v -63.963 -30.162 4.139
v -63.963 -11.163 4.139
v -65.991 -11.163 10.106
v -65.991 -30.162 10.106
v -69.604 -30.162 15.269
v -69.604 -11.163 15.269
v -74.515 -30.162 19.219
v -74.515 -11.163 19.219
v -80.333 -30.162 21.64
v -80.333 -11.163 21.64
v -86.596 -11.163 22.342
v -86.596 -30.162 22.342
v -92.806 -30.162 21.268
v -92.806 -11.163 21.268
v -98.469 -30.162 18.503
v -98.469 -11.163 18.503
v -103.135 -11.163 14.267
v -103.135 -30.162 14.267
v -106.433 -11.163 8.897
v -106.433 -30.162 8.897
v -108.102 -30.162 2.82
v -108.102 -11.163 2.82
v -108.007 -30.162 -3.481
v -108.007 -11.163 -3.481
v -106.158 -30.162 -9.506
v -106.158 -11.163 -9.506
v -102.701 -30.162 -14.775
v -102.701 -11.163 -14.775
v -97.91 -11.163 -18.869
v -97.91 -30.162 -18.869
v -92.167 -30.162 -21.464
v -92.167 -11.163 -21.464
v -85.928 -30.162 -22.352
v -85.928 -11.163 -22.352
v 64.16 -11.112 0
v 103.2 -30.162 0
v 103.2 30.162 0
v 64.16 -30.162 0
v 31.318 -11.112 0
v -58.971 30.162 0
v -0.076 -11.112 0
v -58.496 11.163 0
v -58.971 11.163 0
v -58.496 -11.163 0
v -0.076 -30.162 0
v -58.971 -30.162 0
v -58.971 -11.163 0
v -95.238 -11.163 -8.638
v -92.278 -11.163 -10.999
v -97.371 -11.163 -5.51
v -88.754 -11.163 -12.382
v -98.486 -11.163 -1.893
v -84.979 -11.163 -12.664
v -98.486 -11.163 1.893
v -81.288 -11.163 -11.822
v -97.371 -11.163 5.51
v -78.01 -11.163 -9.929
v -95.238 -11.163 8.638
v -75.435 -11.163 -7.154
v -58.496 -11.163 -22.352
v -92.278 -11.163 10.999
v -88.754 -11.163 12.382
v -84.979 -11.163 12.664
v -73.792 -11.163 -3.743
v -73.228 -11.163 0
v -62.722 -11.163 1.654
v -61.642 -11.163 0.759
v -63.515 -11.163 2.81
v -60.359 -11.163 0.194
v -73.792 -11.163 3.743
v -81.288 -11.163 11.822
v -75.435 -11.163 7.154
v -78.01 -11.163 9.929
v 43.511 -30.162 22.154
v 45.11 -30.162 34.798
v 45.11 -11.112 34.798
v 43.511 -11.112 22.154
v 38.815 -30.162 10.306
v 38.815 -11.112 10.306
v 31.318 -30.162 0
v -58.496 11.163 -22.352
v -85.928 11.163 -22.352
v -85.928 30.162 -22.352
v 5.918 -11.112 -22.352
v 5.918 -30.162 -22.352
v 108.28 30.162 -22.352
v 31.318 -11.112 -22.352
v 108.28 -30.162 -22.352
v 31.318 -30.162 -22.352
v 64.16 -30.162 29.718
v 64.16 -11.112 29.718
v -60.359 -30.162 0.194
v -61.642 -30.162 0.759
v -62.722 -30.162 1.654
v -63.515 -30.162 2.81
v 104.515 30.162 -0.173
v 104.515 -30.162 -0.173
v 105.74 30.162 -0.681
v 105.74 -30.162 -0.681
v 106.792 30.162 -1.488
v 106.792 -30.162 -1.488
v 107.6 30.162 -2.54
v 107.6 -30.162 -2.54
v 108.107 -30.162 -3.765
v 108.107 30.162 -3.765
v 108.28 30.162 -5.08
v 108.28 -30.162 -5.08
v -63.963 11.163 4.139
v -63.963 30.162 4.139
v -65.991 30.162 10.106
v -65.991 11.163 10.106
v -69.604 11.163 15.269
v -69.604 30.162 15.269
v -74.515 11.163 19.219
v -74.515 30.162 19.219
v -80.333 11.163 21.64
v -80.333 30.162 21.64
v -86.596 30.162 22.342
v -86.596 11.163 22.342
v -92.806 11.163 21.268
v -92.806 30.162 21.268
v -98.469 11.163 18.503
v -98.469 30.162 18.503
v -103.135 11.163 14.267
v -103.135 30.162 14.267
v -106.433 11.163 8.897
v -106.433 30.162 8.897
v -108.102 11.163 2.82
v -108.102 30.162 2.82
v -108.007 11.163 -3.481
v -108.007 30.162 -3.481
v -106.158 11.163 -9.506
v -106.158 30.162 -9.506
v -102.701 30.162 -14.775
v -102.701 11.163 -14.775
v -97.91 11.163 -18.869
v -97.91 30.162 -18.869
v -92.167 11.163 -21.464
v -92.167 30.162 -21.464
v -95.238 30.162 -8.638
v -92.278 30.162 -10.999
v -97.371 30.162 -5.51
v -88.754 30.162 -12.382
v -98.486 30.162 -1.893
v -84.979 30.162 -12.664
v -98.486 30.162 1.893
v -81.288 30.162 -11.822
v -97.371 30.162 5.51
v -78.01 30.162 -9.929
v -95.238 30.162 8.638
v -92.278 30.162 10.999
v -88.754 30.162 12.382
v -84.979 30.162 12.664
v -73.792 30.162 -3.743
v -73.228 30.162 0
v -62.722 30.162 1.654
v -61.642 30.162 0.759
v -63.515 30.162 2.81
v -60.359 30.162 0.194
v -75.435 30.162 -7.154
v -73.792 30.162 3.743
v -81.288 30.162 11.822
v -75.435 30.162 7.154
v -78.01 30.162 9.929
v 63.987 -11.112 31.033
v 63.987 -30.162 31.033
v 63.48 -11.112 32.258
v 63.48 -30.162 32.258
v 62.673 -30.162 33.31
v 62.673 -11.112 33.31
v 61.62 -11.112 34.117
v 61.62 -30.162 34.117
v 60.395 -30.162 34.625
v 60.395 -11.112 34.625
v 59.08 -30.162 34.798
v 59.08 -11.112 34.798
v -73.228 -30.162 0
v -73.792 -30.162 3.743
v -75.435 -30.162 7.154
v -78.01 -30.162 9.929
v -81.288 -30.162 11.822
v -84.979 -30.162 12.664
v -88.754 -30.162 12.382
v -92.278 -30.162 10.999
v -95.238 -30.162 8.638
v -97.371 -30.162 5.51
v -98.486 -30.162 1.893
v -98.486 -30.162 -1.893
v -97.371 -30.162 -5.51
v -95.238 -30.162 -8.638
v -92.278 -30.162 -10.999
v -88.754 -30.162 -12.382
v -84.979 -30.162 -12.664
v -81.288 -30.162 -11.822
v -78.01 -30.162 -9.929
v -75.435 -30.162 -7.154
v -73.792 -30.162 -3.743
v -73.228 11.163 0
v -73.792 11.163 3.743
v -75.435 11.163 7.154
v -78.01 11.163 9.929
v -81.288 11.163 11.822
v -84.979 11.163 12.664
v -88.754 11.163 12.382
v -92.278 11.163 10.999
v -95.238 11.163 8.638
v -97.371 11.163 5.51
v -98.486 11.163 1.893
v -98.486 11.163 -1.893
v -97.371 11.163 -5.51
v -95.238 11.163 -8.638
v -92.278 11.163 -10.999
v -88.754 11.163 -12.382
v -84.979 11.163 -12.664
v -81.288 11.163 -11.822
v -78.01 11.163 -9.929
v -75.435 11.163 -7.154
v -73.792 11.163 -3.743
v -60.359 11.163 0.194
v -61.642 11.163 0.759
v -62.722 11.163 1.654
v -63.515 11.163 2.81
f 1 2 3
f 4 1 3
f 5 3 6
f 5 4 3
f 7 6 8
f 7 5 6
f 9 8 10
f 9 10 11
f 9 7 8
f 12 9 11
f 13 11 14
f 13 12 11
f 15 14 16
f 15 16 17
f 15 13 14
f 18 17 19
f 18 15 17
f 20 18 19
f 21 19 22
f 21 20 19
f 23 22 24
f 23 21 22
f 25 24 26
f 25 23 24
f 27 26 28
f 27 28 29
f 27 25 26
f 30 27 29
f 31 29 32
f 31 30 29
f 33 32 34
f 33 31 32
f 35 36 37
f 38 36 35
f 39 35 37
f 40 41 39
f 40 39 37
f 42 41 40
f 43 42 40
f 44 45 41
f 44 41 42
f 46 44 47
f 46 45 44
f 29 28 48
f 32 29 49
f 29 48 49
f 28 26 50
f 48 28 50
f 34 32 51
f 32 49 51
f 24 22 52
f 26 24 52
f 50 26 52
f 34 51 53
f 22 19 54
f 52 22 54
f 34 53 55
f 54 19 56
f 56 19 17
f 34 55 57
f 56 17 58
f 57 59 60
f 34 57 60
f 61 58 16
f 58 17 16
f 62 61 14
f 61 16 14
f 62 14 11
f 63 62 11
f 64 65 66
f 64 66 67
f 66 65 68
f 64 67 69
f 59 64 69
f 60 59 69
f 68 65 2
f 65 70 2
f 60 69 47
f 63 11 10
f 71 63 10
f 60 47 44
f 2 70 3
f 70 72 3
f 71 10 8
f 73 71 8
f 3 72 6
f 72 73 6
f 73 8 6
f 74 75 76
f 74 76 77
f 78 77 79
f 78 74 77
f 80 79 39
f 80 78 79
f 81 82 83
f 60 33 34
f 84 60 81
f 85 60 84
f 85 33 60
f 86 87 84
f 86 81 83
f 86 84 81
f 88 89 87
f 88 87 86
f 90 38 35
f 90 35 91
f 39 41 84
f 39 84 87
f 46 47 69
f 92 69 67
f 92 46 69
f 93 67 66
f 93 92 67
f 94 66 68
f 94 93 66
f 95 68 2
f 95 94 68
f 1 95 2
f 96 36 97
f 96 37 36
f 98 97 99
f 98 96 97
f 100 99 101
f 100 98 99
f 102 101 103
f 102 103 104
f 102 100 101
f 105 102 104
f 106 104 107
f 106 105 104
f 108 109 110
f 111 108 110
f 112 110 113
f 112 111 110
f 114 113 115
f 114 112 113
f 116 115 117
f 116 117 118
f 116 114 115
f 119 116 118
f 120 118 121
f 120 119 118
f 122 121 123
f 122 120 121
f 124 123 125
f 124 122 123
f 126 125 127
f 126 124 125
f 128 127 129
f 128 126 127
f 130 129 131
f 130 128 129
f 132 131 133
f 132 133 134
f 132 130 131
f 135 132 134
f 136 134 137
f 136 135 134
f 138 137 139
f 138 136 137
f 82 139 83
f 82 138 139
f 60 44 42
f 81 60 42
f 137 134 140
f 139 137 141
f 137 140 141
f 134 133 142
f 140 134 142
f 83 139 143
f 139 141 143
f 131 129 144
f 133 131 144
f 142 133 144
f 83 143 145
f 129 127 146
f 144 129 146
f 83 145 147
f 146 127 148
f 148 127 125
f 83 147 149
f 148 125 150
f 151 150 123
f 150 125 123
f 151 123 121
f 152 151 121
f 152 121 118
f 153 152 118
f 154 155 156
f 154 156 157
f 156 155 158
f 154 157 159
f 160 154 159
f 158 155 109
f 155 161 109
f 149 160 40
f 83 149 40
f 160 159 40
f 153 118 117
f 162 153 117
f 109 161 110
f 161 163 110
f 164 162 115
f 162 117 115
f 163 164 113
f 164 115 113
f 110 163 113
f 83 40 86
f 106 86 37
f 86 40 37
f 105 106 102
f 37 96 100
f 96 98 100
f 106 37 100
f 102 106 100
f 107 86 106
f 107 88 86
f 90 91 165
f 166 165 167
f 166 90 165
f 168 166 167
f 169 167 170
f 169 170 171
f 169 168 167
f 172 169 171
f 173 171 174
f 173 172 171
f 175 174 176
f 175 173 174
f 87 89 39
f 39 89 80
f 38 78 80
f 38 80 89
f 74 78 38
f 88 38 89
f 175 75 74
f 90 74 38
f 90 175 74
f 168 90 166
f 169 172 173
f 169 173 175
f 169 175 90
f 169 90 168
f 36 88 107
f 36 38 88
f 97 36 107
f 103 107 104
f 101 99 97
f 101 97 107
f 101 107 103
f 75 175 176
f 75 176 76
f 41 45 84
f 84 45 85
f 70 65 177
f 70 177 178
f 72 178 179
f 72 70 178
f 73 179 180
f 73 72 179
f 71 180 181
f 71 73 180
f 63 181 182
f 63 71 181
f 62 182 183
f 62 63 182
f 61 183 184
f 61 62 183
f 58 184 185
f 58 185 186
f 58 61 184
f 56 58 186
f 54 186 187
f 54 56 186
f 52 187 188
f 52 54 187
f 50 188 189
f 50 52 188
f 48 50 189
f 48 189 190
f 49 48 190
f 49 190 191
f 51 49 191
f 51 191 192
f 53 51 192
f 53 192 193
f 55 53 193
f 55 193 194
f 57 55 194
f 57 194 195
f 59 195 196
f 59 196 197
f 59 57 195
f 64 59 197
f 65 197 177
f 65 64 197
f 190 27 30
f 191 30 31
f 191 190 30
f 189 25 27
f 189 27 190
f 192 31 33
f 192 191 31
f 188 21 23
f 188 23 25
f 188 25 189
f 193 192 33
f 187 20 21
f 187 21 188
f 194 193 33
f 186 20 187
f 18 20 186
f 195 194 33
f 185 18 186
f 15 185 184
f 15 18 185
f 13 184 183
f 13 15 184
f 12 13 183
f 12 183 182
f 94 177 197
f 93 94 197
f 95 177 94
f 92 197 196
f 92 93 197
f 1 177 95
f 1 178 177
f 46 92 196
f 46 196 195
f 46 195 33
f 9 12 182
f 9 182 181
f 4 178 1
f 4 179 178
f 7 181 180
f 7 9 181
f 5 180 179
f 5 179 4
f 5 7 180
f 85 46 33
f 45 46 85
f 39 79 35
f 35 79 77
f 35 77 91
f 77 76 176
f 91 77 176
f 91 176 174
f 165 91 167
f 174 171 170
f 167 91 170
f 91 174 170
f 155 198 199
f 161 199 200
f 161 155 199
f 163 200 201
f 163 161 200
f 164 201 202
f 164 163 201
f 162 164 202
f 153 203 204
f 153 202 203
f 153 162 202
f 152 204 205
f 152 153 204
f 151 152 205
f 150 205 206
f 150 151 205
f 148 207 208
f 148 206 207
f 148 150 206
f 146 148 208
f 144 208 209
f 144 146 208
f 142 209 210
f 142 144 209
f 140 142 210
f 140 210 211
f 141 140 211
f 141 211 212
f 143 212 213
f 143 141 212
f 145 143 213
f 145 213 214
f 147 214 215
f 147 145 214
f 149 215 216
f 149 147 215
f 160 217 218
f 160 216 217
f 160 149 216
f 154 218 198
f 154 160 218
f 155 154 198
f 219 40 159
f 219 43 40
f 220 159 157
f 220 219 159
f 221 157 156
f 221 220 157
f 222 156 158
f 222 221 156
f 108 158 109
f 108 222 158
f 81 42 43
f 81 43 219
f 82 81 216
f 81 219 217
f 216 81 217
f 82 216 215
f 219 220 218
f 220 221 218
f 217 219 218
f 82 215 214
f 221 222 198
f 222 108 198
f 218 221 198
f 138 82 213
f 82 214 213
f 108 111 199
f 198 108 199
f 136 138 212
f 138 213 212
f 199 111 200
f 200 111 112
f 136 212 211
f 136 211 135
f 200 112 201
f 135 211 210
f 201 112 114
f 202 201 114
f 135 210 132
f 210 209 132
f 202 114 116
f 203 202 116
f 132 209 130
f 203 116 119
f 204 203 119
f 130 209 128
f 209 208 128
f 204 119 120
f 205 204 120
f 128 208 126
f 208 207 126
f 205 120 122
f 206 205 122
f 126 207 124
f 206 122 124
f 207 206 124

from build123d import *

# Parameters (mm, degrees)
F0_R     = 12.7
F1_DEPTH = 30.1625
F2_W     = 5.08
F2_H     = 22.3266
F2_W_2   = 65.9883690595
F3_DEPTH = 254
F5_DEPTH = 19.05
F7_DEPTH = 19.05
F8_R     = 5.08


with BuildPart() as f1:
    # F0 (on Front) → F1 (new body, symmetric)
    with BuildSketch(Plane.XZ):
        with BuildLine():
            Line((108.2802, 0), (-63.5762, 0))
            ThreePointArc((-63.5762, 0), (-101.7334507731, 15.8052507731), (-85.9282, -22.352))
            Line((-85.9282, -22.352), (108.2802, -22.352))
            Line((108.2802, -22.352), (108.2802, 0))
        make_face()
        with Locations((-85.9282, 0)):
            Circle(F0_R, mode=Mode.SUBTRACT)
    extrude(amount=F1_DEPTH, both=True)

    # F2 (on face) → F3 (cut, symmetric)
    with BuildSketch(Plane.XY):
        with Locations((-61.0362, 0)):
            Rectangle(F2_W, F2_H)
        with Locations((-96.5703845298, 0)):
            Rectangle(F2_W_2, F2_H)
    extrude(amount=F3_DEPTH, both=True, mode=Mode.SUBTRACT)

    # F4 (on face) → F5 (cut)
    with BuildSketch(Plane.XZ.offset(30.1625)):
        Polygon((31.3182, 0), (-0.0762, 0), (5.9182, -22.352), (31.3182, -22.352), align=None)
    extrude(amount=-F5_DEPTH, mode=Mode.SUBTRACT)

    # F6 (on face) → F7 (join)
    with BuildSketch(Plane.XZ.offset(30.1625)):
        with BuildLine():
            ThreePointArc((64.1604, 29.718), (62.6725024484, 33.3101024484), (59.0804, 34.798))
            Line((59.0804, 34.798), (45.1104, 34.798))
            ThreePointArc((45.1104, 34.798), (41.5362153616, 16.0823576341), (31.3182, 0))
            Line((31.3182, 0), (64.1604, 0))
            Line((64.1604, 0), (64.1604, 29.718))
        make_face()
    extrude(amount=-F7_DEPTH)

    # F8
    f8_edges = [f1.edges().sort_by_distance(p)[0] for p in [
        (-63.5762, -20.6629, 0),
        (-63.5762, 20.6629, 0),
        (108.2802, 0, 0),
    ]]
    fillet(f8_edges, radius=F8_R)


solid = f1.part
